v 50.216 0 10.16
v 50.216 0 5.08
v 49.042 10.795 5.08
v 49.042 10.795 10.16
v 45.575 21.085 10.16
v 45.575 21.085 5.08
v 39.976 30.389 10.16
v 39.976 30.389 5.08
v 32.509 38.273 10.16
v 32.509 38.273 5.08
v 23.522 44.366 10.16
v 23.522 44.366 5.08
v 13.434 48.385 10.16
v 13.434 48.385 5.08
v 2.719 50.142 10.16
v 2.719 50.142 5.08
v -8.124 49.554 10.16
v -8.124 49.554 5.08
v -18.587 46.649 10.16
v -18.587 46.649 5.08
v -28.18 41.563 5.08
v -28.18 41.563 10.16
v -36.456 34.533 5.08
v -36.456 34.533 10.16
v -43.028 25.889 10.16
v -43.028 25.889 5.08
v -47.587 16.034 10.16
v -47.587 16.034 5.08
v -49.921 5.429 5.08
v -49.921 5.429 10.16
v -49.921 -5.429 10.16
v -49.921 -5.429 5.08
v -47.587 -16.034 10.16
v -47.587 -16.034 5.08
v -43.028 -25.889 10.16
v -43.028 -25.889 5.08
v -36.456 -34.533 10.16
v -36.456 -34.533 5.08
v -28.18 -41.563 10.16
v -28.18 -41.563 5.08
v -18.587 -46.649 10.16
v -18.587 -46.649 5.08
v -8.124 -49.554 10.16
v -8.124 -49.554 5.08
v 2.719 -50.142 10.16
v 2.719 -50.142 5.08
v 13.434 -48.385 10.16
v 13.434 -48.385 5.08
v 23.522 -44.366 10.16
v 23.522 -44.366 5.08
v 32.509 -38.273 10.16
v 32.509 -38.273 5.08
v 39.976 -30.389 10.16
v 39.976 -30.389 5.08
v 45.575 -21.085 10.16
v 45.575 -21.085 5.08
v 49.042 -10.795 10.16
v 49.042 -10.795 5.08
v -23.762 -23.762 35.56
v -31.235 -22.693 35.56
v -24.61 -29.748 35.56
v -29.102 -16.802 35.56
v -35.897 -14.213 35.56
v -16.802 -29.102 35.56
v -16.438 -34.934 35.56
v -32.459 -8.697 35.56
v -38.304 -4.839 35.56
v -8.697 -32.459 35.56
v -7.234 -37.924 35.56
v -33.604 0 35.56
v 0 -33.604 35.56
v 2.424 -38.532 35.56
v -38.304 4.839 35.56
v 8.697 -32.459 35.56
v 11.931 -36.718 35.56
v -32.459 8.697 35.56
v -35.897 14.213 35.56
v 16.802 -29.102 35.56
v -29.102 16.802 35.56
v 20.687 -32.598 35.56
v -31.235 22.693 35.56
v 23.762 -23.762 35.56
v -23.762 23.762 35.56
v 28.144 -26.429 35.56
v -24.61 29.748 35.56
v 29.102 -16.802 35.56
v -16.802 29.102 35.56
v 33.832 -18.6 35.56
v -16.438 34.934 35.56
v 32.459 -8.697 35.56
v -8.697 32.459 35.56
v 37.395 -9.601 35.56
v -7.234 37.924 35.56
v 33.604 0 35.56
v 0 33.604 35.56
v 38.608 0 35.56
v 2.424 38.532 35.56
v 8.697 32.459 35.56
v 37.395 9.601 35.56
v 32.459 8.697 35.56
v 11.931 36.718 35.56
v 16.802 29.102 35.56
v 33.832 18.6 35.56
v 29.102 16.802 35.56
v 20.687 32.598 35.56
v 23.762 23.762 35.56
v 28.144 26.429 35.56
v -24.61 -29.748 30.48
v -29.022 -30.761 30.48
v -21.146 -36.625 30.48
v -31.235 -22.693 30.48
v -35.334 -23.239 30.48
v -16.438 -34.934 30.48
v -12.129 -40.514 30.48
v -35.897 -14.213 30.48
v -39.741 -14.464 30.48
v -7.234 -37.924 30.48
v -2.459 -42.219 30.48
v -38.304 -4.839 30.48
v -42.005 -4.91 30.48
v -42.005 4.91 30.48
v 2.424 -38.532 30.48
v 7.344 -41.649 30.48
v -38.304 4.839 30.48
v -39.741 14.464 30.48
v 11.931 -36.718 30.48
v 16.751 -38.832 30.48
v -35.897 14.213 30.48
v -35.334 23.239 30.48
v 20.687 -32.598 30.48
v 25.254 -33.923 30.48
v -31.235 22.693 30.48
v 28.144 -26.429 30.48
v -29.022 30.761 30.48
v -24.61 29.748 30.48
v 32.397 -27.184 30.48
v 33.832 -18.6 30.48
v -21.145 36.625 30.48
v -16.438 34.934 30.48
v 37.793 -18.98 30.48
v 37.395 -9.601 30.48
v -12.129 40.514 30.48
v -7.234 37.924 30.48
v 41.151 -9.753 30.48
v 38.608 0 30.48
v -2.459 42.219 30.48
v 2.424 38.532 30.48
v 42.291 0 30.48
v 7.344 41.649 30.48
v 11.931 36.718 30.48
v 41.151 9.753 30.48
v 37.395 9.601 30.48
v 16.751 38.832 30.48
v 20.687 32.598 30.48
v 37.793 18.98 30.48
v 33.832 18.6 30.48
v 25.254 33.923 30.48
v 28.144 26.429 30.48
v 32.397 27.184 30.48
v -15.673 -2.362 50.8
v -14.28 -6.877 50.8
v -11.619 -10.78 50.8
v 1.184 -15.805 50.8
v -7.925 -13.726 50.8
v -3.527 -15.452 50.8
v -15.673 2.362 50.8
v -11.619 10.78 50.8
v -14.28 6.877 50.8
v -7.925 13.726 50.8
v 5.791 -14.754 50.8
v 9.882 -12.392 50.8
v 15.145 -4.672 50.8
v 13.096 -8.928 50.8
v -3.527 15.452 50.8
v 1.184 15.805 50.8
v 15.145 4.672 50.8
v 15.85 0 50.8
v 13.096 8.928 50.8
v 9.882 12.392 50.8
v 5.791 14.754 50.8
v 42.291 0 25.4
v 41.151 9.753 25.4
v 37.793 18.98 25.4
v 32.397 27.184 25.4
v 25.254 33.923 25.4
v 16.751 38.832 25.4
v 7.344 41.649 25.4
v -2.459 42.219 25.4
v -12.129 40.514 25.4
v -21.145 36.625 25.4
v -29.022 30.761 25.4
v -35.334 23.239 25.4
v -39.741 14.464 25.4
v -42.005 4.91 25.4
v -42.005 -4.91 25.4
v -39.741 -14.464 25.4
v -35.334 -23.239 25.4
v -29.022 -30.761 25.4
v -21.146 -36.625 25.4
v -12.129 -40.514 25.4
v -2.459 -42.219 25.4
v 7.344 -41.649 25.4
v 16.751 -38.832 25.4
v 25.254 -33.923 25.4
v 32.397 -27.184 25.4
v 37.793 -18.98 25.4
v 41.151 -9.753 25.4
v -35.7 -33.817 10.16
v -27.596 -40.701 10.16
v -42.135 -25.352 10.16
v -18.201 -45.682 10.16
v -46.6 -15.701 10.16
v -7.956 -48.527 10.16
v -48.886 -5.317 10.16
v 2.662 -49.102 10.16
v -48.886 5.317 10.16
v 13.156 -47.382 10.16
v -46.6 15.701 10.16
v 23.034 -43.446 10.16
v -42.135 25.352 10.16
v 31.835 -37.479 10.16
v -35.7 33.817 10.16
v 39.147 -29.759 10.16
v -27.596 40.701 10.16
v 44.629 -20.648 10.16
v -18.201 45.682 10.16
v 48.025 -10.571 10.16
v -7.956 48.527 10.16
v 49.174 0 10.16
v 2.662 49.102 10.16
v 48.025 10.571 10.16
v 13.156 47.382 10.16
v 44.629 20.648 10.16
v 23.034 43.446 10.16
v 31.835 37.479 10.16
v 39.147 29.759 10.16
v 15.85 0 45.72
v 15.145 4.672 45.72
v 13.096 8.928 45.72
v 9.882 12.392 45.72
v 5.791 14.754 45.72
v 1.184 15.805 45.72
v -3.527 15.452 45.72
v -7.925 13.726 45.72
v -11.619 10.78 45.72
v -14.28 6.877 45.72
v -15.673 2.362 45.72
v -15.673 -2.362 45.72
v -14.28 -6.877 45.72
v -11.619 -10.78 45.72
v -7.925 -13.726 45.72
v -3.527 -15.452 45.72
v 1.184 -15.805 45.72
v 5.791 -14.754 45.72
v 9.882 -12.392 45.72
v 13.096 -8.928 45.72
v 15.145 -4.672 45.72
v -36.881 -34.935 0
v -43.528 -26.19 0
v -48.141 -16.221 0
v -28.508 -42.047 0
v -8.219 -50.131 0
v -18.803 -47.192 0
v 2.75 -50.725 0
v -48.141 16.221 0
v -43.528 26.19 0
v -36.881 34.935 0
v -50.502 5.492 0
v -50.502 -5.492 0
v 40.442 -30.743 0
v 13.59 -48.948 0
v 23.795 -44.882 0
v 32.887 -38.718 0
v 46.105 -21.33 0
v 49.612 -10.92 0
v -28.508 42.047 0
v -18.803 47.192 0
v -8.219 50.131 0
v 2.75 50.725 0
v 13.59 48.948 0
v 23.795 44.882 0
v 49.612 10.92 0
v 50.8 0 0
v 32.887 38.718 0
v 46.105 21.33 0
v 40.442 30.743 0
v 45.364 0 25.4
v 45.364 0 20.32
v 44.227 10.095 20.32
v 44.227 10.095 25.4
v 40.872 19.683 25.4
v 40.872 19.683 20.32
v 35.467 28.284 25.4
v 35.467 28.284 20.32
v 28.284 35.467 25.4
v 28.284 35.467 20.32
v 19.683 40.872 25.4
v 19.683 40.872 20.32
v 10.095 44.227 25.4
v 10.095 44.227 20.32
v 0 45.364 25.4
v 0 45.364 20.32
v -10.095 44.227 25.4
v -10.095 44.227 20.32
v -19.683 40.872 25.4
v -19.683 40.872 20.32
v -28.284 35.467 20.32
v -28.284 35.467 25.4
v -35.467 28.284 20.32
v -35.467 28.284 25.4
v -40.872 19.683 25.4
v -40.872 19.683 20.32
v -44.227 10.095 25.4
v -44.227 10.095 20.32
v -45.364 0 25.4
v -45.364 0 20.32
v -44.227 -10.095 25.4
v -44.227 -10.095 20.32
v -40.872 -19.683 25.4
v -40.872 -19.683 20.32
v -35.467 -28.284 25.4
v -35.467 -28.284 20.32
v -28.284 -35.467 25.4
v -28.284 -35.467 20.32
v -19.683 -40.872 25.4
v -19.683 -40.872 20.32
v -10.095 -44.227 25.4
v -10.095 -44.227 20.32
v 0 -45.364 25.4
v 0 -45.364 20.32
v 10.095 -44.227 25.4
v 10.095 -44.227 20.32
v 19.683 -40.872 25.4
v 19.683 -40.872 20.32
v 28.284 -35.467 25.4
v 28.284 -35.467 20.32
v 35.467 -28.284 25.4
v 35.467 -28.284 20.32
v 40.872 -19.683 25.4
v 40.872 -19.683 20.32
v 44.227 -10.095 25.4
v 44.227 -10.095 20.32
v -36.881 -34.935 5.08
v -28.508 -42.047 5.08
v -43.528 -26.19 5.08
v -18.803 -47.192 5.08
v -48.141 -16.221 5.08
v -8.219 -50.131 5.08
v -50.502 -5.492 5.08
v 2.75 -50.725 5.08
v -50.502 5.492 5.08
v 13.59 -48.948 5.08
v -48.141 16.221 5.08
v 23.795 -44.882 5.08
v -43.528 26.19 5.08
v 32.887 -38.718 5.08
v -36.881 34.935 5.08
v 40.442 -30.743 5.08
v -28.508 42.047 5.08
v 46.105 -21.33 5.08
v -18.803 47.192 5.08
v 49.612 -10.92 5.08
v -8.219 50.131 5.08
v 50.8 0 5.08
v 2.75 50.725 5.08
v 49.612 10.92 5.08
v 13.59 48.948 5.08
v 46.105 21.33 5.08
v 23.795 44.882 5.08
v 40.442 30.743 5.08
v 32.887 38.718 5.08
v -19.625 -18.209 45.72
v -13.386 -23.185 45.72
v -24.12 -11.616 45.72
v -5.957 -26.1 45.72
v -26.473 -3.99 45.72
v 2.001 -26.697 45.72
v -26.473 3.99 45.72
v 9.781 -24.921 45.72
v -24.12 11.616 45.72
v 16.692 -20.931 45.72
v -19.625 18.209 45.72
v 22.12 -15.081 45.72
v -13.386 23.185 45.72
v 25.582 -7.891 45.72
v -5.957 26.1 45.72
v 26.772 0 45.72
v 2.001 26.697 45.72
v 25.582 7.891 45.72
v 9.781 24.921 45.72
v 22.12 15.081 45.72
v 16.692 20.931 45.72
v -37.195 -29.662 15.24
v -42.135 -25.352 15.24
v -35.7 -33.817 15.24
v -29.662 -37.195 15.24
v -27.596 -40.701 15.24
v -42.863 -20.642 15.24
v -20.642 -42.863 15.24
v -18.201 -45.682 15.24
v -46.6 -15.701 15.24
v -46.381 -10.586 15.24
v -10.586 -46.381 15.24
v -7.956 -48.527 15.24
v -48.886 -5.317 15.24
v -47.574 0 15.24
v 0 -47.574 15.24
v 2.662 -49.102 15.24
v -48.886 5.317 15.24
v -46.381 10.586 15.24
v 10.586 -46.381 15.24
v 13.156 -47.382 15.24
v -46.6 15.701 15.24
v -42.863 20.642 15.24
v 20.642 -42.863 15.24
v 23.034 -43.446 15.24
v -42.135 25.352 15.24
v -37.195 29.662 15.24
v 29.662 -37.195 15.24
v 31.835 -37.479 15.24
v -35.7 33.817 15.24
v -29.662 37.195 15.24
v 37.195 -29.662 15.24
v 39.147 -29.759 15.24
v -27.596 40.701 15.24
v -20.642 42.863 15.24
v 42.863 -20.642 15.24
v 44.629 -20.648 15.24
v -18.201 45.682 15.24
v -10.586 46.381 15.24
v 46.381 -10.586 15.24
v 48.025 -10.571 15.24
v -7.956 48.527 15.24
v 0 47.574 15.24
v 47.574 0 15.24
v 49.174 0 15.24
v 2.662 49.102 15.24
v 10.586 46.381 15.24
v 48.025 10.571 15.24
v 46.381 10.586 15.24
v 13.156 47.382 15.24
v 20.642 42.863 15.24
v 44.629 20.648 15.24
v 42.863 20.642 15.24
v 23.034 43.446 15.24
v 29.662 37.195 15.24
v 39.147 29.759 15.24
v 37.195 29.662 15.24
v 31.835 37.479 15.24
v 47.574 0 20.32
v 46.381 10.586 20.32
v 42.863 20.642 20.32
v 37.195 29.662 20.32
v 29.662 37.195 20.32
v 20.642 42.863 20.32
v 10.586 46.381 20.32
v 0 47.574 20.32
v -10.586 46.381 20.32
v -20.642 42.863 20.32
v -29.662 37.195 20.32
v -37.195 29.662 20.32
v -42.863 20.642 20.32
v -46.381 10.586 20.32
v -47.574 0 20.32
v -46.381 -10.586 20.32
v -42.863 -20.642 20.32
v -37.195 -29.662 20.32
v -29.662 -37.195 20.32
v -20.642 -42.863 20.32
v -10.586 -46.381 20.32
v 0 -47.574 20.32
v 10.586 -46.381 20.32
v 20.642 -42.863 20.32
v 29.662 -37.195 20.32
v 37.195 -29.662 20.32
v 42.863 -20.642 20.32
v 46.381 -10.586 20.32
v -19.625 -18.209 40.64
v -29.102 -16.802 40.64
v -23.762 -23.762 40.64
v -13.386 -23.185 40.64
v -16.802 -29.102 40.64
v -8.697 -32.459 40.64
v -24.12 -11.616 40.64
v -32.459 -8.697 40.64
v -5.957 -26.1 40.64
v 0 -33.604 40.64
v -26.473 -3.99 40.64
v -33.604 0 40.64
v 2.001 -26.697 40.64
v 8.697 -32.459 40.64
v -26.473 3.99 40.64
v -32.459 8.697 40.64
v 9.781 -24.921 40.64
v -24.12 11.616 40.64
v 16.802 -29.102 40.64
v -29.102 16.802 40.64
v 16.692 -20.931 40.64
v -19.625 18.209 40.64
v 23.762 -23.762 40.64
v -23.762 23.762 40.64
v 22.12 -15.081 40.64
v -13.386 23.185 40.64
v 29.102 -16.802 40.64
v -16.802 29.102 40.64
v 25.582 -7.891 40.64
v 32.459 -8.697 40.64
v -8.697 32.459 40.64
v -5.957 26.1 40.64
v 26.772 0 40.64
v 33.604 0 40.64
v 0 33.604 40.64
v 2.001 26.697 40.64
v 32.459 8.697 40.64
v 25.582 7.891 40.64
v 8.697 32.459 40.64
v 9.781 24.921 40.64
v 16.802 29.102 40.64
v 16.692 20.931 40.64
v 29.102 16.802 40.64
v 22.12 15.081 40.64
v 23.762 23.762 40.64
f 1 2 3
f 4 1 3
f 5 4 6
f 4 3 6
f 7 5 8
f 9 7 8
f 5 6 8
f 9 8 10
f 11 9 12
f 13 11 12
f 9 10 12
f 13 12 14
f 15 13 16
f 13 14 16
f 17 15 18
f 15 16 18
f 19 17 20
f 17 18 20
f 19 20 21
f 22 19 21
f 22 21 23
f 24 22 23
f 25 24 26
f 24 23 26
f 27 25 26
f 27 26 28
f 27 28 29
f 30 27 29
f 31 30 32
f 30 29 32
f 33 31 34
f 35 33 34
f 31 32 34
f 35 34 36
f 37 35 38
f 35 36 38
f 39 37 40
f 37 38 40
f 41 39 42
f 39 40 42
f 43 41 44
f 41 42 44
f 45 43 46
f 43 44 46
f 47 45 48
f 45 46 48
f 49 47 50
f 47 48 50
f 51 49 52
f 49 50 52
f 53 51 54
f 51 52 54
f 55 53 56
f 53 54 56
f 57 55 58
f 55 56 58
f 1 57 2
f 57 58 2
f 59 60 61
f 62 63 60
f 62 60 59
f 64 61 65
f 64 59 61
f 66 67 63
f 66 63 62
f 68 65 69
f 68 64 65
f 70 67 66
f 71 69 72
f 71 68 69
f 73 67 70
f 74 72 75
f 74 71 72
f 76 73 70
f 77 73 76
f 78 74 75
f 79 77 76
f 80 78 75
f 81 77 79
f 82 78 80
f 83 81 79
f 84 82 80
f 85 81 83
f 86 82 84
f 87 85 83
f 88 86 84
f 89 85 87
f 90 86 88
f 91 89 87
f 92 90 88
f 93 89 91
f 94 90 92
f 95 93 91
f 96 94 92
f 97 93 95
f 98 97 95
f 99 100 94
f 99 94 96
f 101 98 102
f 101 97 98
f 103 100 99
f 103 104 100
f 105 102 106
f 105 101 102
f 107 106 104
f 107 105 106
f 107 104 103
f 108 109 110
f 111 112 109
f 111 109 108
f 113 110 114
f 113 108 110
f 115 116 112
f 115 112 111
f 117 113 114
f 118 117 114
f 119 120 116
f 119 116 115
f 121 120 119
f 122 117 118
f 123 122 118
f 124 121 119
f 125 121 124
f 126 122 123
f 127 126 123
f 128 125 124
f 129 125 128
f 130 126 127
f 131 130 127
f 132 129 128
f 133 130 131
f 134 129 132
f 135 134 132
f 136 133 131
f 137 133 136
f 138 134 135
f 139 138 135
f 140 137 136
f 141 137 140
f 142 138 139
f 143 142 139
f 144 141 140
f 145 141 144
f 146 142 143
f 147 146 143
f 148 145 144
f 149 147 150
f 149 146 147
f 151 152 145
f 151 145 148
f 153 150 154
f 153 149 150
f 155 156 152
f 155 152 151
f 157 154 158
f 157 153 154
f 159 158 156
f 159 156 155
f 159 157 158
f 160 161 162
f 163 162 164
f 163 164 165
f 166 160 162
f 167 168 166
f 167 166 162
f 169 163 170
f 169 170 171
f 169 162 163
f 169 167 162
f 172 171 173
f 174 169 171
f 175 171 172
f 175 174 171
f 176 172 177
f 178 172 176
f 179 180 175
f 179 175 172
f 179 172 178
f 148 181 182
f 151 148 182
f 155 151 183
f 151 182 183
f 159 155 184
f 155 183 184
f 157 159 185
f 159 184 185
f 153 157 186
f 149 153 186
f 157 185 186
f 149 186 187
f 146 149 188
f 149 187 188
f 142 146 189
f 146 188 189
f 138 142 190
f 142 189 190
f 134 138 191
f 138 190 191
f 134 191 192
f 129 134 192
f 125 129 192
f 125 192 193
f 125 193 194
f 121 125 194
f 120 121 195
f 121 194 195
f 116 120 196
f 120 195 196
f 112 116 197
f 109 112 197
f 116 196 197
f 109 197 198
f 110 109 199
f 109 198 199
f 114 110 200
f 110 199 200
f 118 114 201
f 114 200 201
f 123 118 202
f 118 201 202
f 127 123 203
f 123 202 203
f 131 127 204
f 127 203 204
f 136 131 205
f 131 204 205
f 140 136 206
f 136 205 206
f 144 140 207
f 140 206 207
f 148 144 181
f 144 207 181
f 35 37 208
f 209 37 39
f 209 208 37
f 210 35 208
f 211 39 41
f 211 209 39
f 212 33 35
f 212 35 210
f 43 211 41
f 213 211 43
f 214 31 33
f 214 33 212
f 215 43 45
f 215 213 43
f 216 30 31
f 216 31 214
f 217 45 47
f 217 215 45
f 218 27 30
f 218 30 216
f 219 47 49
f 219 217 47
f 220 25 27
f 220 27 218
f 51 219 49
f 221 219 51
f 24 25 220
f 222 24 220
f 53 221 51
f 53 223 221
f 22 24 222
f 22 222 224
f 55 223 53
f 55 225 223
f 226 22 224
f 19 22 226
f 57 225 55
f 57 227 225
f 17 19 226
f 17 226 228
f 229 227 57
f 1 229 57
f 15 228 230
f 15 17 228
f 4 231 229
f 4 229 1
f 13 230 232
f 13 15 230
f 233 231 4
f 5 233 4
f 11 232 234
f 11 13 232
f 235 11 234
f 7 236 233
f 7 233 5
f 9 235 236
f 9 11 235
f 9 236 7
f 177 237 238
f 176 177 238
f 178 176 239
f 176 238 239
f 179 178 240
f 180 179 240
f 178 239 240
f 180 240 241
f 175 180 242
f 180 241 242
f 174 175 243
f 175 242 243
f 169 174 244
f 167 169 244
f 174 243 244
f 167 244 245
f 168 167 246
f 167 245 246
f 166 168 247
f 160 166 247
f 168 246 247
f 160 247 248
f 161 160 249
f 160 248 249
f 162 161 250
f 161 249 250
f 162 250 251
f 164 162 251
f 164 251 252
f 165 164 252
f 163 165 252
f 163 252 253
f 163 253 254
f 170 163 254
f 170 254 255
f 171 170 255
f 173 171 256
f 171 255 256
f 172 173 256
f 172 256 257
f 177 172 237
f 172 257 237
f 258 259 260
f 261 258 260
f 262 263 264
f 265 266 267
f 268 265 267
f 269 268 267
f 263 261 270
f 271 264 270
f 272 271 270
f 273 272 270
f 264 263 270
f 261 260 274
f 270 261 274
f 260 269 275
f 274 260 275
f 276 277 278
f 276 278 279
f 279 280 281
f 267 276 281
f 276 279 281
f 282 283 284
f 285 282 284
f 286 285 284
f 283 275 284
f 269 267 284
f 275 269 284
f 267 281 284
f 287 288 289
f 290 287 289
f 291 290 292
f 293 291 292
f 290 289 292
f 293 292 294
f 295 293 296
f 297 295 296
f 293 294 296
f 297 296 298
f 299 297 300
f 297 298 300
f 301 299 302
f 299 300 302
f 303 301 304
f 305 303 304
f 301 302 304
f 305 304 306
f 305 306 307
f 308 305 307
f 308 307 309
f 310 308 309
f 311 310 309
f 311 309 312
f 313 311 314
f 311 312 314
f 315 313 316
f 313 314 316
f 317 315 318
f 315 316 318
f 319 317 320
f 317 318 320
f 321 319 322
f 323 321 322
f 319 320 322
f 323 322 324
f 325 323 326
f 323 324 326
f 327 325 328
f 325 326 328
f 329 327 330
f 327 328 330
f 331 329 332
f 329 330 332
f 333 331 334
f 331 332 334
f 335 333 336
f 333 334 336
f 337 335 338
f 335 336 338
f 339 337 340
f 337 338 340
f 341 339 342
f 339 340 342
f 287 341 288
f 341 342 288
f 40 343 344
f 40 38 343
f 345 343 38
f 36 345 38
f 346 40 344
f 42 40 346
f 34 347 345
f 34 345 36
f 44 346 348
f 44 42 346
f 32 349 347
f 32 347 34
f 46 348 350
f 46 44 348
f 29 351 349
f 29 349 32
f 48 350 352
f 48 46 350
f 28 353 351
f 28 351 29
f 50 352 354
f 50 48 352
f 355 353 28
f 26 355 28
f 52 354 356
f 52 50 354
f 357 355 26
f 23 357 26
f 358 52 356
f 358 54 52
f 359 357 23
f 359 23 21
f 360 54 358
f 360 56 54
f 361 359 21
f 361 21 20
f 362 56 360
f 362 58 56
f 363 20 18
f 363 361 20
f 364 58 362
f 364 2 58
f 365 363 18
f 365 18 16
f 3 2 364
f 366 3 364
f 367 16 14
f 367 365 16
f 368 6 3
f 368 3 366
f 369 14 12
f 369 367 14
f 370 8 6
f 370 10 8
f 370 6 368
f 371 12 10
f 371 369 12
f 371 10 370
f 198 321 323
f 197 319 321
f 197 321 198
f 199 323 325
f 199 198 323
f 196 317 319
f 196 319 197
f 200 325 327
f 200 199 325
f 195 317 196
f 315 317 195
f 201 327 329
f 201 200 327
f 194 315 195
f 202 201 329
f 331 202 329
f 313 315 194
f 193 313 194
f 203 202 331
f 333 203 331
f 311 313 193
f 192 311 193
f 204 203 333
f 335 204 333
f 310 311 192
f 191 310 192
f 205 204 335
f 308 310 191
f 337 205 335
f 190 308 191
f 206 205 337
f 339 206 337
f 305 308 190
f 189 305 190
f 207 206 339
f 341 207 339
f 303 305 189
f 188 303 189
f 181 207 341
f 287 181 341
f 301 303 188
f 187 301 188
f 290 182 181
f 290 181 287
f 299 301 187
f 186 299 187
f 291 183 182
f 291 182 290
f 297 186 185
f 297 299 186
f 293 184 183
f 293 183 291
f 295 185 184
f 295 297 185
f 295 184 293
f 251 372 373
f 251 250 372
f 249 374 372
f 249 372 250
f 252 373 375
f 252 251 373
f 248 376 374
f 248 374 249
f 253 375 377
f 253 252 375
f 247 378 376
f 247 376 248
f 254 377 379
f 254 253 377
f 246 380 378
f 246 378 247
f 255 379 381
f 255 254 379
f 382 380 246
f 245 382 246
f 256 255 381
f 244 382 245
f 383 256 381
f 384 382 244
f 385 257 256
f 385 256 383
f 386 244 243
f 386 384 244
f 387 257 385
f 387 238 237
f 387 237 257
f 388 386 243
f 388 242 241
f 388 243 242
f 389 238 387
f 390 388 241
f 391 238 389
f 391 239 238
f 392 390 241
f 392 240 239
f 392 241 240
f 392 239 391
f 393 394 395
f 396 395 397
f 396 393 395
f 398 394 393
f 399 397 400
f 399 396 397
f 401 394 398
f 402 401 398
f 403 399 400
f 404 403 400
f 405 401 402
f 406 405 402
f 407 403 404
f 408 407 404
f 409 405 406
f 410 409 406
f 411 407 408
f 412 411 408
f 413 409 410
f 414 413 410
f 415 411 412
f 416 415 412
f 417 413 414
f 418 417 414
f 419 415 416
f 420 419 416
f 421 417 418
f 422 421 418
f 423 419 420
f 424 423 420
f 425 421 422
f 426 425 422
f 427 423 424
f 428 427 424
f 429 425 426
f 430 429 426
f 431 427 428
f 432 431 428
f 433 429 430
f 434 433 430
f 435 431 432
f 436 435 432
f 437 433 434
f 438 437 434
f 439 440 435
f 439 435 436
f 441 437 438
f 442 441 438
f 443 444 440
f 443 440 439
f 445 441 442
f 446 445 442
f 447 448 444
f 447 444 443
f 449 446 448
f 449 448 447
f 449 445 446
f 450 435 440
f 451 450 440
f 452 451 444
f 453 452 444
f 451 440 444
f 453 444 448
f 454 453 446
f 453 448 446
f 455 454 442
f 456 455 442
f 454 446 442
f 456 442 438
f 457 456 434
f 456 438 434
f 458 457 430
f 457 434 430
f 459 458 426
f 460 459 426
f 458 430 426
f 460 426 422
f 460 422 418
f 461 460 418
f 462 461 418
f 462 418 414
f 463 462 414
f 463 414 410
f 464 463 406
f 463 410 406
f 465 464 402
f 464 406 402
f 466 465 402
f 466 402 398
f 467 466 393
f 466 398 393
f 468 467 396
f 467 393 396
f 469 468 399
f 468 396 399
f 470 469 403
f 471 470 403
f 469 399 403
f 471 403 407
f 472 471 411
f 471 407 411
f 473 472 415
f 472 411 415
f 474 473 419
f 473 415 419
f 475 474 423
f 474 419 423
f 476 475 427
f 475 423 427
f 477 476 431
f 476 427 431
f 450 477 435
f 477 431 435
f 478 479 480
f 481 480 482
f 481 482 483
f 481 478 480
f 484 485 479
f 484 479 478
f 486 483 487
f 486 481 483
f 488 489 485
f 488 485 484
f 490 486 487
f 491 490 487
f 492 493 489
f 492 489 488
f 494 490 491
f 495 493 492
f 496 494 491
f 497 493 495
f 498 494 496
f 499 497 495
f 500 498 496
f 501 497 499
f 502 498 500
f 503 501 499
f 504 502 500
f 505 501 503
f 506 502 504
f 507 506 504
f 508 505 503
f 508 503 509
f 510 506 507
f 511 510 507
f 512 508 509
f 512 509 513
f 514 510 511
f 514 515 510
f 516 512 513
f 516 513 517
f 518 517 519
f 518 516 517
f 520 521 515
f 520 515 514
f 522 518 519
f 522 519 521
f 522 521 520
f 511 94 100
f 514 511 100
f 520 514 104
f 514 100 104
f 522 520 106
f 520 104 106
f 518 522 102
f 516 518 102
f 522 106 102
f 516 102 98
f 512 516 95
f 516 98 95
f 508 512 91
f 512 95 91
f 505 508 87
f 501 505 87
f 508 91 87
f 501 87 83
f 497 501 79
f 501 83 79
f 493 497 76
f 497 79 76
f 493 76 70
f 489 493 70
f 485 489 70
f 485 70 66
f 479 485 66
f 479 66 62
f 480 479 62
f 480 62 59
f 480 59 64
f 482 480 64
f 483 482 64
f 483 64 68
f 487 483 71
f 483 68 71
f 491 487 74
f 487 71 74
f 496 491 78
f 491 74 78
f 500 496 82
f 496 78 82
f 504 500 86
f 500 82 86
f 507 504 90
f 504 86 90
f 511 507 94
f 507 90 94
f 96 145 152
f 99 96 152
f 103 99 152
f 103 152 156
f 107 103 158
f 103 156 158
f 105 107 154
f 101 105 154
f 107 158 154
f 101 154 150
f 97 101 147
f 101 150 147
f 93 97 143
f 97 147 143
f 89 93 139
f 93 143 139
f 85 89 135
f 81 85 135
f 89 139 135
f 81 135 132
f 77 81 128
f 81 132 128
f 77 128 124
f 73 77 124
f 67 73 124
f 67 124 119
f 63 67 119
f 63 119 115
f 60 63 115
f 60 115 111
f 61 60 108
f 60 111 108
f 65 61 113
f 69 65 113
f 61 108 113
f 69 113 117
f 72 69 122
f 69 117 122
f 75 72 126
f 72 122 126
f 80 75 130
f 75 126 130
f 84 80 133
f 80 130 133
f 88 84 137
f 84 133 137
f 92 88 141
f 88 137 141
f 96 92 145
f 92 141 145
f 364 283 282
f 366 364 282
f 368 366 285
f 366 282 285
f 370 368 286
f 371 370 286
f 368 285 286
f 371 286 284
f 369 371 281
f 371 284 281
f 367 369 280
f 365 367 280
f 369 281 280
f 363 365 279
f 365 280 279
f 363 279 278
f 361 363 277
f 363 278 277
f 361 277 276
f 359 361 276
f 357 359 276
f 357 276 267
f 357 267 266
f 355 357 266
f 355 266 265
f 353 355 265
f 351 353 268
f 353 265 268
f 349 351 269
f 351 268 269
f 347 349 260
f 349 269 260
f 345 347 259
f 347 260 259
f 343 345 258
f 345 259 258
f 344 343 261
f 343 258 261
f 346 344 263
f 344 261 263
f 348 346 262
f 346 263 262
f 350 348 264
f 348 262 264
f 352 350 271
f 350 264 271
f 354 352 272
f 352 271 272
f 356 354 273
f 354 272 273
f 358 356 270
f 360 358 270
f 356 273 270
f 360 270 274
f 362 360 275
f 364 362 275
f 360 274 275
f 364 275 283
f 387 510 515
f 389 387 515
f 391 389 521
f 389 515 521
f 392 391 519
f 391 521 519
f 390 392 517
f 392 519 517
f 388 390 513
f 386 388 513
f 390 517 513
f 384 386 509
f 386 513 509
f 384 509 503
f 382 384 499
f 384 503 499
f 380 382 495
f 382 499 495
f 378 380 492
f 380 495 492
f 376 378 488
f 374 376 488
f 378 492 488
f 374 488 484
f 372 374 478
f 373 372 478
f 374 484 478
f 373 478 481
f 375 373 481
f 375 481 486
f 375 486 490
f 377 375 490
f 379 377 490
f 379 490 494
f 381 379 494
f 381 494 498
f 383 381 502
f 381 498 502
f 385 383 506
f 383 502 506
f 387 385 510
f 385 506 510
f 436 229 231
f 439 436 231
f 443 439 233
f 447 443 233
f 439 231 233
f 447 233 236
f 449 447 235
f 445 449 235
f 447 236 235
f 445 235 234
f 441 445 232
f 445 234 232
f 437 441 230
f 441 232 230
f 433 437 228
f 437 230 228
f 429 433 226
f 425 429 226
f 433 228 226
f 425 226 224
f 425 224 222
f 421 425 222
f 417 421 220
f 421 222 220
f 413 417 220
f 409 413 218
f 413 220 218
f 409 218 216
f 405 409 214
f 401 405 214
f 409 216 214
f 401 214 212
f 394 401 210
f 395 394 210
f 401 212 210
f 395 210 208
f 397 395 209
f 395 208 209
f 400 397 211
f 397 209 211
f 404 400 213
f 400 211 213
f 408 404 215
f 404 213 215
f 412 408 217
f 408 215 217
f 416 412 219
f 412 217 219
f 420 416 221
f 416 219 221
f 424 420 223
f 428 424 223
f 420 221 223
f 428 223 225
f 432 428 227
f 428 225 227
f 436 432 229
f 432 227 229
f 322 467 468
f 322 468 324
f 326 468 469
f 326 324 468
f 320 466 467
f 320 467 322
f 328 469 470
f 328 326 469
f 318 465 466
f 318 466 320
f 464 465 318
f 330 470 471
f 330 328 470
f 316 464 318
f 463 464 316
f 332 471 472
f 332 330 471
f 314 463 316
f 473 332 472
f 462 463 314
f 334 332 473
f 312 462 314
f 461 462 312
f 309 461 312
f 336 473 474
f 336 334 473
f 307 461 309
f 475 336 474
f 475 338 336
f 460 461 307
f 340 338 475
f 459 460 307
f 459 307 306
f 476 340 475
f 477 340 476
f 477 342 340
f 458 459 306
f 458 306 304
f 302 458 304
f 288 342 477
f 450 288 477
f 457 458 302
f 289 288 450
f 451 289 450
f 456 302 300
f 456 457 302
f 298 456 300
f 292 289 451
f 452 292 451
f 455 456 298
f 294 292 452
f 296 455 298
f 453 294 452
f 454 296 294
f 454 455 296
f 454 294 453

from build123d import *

# Parameters (mm, degrees)
F0_R      = 50.8
F1_DEPTH  = 5.08
F2_R      = 50.2158
F3_DEPTH  = 5.08
F4_R      = 49.1744
F5_DEPTH  = 5.08
F6_R      = 47.5742
F7_DEPTH  = 5.08
F8_R      = 45.3644
F9_DEPTH  = 5.08
F10_R     = 42.291
F11_DEPTH = 5.08
F12_R     = 38.608
F13_DEPTH = 5.08
F14_R     = 33.6042
F15_DEPTH = 5.08
F16_R     = 26.7716
F17_DEPTH = 5.08
F18_R     = 15.8496
F19_DEPTH = 5.08


with BuildPart() as f1:
    # F0 (on Top) → F1 (new body)
    with BuildSketch(Plane.XY):
        Circle(F0_R)
    extrude(amount=F1_DEPTH)

    # F2 (on face) → F3 (join)
    with BuildSketch(Plane.XY.offset(5.08)):
        Circle(F2_R)
    extrude(amount=F3_DEPTH)

    # F4 (on face) → F5 (join)
    with BuildSketch(Plane.XY.offset(10.16)):
        Circle(F4_R)
    extrude(amount=F5_DEPTH)

    # F6 (on face) → F7 (join)
    with BuildSketch(Plane.XY.offset(15.24)):
        Circle(F6_R)
    extrude(amount=F7_DEPTH)

    # F8 (on face) → F9 (join)
    with BuildSketch(Plane.XY.offset(20.32)):
        Circle(F8_R)
    extrude(amount=F9_DEPTH)

    # F10 (on face) → F11 (join)
    with BuildSketch(Plane.XY.offset(25.4)):
        Circle(F10_R)
    extrude(amount=F11_DEPTH)

    # F12 (on face) → F13 (join)
    with BuildSketch(Plane.XY.offset(30.48)):
        Circle(F12_R)
    extrude(amount=F13_DEPTH)

    # F14 (on face) → F15 (join)
    with BuildSketch(Plane.XY.offset(35.56)):
        Circle(F14_R)
    extrude(amount=F15_DEPTH)

    # F16 (on face) → F17 (join)
    with BuildSketch(Plane.XY.offset(40.64)):
        Circle(F16_R)
    extrude(amount=F17_DEPTH)

    # F18 (on face) → F19 (join)
    with BuildSketch(Plane.XY.offset(45.72)):
        Circle(F18_R)
    extrude(amount=F19_DEPTH)


solid = f1.part
